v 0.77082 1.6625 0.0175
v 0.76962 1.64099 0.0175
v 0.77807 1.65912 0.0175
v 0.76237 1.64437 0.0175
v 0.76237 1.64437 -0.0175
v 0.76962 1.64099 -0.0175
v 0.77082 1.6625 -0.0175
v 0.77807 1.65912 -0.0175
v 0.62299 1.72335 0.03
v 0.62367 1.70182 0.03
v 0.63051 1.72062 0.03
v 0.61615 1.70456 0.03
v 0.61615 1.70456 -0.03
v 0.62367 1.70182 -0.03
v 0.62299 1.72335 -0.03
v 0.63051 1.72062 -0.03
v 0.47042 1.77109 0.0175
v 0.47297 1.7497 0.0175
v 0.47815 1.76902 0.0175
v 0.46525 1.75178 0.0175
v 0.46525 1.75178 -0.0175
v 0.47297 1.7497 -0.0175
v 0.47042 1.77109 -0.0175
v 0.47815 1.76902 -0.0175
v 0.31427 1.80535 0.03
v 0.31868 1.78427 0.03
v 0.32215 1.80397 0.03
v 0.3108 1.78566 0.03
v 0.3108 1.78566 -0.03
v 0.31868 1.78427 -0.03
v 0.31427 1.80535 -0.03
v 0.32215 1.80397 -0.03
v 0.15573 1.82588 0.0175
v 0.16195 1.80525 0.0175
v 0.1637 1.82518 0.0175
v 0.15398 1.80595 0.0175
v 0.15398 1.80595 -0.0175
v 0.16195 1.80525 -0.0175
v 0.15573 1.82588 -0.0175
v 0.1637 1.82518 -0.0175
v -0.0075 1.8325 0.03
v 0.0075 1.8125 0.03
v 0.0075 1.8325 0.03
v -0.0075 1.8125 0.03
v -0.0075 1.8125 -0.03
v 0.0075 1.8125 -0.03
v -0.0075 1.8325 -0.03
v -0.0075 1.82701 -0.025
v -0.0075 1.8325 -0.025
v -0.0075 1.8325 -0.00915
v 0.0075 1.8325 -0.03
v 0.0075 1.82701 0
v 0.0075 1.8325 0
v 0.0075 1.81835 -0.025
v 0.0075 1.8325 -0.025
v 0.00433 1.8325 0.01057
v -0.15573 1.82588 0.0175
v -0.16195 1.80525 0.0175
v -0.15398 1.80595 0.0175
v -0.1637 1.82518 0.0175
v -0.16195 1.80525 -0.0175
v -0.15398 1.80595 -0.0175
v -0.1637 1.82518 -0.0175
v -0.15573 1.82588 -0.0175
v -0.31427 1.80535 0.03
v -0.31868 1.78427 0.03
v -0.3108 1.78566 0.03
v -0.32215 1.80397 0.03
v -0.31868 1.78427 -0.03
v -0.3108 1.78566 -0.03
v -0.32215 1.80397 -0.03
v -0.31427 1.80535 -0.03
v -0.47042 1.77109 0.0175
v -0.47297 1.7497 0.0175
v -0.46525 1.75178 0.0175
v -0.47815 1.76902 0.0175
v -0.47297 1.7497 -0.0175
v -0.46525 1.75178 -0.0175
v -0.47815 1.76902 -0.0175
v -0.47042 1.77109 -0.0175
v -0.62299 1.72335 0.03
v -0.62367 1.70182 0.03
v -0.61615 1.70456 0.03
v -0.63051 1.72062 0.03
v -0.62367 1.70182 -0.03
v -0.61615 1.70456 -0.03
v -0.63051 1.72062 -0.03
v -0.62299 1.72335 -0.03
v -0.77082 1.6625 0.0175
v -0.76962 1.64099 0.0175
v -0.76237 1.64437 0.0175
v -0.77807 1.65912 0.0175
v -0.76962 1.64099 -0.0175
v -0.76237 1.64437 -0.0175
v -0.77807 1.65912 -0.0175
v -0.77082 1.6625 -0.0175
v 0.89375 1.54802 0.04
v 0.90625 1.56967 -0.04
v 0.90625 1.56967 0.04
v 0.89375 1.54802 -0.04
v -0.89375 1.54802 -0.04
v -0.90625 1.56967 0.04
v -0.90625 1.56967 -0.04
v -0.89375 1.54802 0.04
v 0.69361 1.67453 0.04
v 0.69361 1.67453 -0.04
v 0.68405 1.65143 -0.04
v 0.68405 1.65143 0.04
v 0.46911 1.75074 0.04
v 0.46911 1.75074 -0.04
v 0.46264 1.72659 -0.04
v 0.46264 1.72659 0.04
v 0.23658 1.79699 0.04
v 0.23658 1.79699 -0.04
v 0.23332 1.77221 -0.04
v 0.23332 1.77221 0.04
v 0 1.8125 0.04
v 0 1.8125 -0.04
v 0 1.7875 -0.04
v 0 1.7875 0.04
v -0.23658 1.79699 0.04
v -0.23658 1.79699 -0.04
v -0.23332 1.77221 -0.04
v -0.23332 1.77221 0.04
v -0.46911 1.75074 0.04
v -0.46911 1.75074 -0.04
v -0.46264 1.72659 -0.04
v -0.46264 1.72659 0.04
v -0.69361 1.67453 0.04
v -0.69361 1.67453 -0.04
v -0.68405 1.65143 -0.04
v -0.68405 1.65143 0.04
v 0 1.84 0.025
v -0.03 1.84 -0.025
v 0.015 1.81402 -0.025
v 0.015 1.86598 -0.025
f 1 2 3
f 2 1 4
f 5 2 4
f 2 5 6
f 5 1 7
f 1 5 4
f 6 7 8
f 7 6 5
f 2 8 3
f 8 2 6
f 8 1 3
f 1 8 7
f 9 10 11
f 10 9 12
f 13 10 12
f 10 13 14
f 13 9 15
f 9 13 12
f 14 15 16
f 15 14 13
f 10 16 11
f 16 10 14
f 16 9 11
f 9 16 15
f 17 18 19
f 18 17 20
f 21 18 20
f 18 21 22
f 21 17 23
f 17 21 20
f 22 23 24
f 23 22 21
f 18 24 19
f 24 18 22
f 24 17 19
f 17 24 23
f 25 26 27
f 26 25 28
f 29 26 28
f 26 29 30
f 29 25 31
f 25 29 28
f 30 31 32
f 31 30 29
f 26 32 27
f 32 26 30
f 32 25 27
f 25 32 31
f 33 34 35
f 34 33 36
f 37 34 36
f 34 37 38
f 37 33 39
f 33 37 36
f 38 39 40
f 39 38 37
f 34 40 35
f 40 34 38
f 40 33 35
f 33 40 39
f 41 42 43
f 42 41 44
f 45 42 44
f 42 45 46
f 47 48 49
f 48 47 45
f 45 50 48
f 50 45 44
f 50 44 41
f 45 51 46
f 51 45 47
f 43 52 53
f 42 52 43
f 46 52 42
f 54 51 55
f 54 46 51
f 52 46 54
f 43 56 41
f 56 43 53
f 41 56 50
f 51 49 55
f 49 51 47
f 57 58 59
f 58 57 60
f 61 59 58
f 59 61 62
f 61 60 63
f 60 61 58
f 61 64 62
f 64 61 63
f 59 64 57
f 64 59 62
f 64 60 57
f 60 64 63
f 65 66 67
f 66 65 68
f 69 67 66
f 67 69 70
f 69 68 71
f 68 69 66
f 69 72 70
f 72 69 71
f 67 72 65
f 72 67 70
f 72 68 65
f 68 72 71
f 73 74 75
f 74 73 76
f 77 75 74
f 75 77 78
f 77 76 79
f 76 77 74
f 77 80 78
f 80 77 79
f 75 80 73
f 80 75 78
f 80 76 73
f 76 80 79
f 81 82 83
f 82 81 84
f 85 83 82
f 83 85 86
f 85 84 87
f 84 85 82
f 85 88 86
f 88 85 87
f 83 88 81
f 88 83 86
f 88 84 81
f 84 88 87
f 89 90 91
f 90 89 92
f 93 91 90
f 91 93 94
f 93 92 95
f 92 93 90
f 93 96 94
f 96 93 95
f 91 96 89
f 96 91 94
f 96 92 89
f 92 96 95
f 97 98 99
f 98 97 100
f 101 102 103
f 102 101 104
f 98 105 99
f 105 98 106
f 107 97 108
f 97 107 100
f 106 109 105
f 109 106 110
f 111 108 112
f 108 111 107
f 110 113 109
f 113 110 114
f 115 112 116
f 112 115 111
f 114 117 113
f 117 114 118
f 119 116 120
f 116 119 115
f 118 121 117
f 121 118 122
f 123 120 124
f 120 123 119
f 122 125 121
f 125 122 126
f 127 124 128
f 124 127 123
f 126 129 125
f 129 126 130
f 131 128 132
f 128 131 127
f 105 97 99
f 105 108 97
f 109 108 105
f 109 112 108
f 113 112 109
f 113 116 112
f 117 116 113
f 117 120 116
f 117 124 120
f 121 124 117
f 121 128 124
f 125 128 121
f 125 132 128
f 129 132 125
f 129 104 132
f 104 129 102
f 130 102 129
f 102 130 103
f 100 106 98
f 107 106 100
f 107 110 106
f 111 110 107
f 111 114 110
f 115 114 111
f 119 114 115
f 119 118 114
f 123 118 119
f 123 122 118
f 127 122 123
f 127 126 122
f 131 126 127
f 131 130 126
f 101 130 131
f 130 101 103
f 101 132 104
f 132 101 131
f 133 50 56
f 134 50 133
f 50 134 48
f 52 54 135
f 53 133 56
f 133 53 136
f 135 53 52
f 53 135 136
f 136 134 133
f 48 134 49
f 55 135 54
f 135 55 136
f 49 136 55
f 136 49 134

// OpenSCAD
// camera_hud_compass_tape.scad
// Cylindrical curved tactical heading tape / compass bar for camera-anchored 3D HUD.
// Features graduated bearing notches, cardinal ticks, and central indicator pin.

$fn = 32;

module camera_hud_compass_tape() {
    radius = 1.8;
    tape_h = 0.08;
    thickness = 0.025;
    span_deg = 60;

    // Curved backing arc
    rotate([0, 0, 90 - span_deg/2])
    rotate_extrude(angle = span_deg, $fn = 48)
    translate([radius, 0, 0])
    square([thickness, tape_h], center = true);

    // Graduated tick marks radiating along arc
    for (deg = [-25, -20, -15, -10, -5, 0, 5, 10, 15, 20, 25]) {
        tick_h = (deg % 10 == 0) ? 0.06 : 0.035;
        tick_w = (deg == 0) ? 0.015 : 0.008;

        rotate([0, 0, 90 + deg])
        translate([radius + thickness/2 + 0.01, 0, 0])
        cube([0.02, tick_w, tick_h], center = true);
    }

    // Top heading indicator triangle (lubber line)
    translate([0, radius + 0.04, 0])
    rotate([0, 0, 180])
    cylinder(r1 = 0.03, r2 = 0.0, h = 0.05, center = true, $fn = 3);
}

camera_hud_compass_tape();
